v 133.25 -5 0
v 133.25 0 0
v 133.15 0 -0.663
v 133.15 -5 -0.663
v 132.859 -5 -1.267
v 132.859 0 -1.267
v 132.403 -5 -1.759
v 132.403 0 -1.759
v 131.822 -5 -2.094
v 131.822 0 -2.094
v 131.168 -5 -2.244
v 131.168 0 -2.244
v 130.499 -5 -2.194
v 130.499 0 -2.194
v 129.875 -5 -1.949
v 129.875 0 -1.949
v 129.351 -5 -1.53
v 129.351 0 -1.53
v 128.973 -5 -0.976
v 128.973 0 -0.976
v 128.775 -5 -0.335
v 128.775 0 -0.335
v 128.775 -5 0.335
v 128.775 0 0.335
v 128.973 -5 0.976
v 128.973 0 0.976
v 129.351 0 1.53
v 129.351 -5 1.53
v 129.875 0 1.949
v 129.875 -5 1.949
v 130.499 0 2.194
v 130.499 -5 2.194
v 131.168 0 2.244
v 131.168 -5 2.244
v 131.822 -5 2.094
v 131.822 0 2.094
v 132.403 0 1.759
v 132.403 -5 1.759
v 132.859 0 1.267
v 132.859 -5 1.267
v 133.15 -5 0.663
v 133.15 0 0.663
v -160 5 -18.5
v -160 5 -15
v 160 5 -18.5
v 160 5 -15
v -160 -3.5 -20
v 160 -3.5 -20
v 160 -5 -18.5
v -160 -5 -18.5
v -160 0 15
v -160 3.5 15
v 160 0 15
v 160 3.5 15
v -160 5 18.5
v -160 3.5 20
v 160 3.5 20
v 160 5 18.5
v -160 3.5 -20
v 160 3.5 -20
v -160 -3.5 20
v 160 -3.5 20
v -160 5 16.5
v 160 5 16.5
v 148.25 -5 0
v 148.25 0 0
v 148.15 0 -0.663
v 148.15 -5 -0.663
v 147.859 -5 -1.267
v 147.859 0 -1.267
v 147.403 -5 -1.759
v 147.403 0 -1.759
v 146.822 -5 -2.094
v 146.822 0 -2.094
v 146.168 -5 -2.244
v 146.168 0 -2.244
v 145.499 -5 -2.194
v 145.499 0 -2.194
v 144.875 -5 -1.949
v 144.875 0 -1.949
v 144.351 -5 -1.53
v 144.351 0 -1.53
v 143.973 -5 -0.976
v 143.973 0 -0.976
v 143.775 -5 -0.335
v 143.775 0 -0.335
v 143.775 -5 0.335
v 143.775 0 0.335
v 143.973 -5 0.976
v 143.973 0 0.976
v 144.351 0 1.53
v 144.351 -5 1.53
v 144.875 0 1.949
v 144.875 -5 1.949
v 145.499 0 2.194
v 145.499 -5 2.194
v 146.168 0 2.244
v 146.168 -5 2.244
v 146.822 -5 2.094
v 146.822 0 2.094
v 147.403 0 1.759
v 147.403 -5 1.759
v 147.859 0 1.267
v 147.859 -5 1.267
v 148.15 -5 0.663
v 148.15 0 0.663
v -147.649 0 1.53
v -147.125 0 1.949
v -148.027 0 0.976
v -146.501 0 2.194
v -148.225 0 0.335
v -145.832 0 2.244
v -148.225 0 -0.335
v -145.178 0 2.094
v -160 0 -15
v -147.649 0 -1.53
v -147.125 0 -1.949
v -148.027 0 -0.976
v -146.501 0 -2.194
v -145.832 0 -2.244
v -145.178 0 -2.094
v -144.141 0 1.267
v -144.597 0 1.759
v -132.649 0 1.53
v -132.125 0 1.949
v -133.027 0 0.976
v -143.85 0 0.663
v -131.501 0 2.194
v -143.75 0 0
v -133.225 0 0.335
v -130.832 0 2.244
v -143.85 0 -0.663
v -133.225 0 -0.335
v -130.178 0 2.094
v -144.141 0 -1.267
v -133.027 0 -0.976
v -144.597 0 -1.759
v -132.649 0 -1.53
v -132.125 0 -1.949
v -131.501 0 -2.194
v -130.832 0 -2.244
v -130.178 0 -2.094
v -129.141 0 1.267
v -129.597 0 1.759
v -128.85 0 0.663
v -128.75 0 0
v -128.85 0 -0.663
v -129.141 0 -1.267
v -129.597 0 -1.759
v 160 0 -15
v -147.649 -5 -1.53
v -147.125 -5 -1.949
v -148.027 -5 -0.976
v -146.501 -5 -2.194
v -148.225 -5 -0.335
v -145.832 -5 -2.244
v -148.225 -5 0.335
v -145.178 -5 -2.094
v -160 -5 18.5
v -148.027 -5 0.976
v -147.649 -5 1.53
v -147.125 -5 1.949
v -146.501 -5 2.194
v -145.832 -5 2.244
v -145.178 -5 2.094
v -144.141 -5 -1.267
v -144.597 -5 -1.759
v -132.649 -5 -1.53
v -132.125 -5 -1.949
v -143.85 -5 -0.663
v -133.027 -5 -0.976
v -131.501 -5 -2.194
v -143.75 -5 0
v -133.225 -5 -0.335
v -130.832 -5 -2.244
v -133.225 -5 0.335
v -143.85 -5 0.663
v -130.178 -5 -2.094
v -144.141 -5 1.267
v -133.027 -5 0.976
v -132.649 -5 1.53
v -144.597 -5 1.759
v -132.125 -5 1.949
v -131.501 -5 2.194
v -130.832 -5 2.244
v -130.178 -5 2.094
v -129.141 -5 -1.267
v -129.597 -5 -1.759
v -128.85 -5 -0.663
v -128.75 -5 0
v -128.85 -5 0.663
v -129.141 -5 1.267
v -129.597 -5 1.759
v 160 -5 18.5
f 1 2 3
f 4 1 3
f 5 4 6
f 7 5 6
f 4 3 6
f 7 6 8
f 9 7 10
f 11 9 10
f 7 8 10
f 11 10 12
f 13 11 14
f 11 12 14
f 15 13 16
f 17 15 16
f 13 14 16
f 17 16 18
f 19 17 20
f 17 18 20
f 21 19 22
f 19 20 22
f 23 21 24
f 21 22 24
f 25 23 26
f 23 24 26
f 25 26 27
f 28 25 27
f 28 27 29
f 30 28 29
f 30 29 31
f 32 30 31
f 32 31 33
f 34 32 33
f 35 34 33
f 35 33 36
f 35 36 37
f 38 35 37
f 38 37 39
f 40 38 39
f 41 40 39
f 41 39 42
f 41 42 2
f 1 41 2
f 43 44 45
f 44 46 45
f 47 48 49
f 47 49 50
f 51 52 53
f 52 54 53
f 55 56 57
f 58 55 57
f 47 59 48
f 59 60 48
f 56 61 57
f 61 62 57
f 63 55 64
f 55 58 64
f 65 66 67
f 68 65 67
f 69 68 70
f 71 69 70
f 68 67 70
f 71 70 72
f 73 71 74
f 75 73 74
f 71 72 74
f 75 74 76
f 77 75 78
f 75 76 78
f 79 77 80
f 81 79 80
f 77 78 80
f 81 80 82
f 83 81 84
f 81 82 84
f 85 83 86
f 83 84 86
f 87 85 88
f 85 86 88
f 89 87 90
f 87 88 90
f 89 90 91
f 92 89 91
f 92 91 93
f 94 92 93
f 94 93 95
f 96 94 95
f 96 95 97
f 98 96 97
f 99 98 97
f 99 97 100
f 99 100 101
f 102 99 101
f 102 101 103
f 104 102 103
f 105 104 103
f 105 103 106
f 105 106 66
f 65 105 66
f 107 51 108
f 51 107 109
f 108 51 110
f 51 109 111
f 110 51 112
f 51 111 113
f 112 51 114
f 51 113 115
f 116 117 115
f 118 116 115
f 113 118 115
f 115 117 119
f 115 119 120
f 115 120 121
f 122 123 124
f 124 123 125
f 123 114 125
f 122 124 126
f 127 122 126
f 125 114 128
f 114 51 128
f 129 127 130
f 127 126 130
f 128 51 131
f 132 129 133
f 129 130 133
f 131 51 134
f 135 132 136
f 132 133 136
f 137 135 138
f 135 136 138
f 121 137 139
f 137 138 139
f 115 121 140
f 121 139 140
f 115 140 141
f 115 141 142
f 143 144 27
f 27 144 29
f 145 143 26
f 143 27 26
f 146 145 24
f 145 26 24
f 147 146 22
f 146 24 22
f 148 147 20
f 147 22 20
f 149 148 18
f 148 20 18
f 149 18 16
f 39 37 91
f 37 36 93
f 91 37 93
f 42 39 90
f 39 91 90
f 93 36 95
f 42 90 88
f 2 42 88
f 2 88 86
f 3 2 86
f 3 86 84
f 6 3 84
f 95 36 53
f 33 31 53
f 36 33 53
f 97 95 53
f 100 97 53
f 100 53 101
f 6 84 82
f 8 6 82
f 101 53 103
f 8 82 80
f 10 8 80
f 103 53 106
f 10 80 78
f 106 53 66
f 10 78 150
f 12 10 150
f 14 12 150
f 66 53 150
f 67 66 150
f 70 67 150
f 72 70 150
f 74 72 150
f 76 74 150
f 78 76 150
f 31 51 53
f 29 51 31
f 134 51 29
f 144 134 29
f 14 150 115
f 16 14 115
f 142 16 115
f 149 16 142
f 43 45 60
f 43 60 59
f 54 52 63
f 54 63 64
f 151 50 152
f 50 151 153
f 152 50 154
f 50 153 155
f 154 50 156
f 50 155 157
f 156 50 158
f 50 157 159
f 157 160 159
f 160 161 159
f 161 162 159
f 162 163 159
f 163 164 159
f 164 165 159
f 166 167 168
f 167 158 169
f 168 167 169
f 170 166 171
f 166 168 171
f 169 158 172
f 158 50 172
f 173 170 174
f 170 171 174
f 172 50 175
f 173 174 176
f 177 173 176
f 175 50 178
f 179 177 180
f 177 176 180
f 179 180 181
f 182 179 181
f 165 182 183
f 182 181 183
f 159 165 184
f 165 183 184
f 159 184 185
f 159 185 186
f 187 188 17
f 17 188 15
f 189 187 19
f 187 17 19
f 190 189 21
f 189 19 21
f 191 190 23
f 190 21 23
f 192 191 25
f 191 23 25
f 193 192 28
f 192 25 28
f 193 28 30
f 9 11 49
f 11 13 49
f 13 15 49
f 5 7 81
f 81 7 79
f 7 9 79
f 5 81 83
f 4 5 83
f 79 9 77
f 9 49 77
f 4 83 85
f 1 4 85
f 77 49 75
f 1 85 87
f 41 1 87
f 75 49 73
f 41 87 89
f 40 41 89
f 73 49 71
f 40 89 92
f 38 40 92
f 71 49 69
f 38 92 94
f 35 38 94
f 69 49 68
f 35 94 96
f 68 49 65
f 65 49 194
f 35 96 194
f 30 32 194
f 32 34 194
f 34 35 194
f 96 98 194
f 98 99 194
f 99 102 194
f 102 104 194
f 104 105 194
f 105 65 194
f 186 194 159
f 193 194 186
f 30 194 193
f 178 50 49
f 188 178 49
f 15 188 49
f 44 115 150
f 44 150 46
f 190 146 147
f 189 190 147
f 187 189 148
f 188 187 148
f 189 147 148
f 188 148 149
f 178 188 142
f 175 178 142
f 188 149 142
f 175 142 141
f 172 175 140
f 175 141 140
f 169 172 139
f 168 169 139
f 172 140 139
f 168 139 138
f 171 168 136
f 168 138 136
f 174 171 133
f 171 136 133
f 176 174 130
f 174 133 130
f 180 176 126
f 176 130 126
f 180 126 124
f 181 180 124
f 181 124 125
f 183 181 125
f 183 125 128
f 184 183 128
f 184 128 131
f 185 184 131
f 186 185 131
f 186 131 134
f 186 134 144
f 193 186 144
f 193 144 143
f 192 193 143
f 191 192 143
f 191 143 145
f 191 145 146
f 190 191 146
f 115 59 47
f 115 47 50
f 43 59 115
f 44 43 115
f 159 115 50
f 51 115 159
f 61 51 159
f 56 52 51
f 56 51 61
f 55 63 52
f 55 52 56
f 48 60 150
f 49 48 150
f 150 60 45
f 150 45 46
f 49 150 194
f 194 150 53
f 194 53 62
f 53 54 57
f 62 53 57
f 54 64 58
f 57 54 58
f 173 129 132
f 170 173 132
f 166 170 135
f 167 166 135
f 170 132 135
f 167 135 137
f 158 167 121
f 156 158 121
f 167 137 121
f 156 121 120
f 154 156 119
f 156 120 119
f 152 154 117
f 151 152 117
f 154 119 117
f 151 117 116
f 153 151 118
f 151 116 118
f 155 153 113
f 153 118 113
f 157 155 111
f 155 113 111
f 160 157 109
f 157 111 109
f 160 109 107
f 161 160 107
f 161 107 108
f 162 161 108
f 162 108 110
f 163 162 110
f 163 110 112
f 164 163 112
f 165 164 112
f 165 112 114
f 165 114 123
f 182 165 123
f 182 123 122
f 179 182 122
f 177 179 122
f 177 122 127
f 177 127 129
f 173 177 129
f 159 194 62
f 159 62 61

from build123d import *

# Parameters (mm, degrees)
SALIENTE_EXTRUIR1_DEPTH = 160
CHAFL_N1_SIZE           = 1.5
CROQUIS2_R              = 2.25
CORTAR_EXTRUIR1_DEPTH   = 320


with BuildPart() as part:
    # Croquis1 → Saliente-Extruir1 (new body, symmetric)
    with BuildSketch(Plane(origin=(0, 0, 0), x_dir=(0, 0, -1), z_dir=(1, 0, 0))):
        Polygon((-15, 0), (15, 0), (15, 5), (20, 5), (20, -5), (-20, -5), (-20, 5), (-15, 5), align=None)
    extrude(amount=SALIENTE_EXTRUIR1_DEPTH, both=True)

    # Chaflán1
    chafl_n1_edges = [part.edges().sort_by_distance(p)[0] for p in [
        (0, 5, -20),
        (0, -5, -20),
        (0, -5, 20),
        (0, 5, 20),
        (0, 5, 15),
    ]]
    chamfer(chafl_n1_edges, length=CHAFL_N1_SIZE)

    # Croquis2 → Cortar-Extruir1 (cut)
    with BuildSketch(Plane(origin=(0, 0, 0), x_dir=(1, 0, 0), z_dir=(0, 1, 0))):
        with Locations((-146, 0)):
            Circle(CROQUIS2_R)
        with Locations((-131, 0)):
            Circle(CROQUIS2_R)
        with Locations((131, 0)):
            Circle(CROQUIS2_R)
        with Locations((146, 0)):
            Circle(CROQUIS2_R)
    extrude(amount=-CORTAR_EXTRUIR1_DEPTH, mode=Mode.SUBTRACT)


solid = part.part
